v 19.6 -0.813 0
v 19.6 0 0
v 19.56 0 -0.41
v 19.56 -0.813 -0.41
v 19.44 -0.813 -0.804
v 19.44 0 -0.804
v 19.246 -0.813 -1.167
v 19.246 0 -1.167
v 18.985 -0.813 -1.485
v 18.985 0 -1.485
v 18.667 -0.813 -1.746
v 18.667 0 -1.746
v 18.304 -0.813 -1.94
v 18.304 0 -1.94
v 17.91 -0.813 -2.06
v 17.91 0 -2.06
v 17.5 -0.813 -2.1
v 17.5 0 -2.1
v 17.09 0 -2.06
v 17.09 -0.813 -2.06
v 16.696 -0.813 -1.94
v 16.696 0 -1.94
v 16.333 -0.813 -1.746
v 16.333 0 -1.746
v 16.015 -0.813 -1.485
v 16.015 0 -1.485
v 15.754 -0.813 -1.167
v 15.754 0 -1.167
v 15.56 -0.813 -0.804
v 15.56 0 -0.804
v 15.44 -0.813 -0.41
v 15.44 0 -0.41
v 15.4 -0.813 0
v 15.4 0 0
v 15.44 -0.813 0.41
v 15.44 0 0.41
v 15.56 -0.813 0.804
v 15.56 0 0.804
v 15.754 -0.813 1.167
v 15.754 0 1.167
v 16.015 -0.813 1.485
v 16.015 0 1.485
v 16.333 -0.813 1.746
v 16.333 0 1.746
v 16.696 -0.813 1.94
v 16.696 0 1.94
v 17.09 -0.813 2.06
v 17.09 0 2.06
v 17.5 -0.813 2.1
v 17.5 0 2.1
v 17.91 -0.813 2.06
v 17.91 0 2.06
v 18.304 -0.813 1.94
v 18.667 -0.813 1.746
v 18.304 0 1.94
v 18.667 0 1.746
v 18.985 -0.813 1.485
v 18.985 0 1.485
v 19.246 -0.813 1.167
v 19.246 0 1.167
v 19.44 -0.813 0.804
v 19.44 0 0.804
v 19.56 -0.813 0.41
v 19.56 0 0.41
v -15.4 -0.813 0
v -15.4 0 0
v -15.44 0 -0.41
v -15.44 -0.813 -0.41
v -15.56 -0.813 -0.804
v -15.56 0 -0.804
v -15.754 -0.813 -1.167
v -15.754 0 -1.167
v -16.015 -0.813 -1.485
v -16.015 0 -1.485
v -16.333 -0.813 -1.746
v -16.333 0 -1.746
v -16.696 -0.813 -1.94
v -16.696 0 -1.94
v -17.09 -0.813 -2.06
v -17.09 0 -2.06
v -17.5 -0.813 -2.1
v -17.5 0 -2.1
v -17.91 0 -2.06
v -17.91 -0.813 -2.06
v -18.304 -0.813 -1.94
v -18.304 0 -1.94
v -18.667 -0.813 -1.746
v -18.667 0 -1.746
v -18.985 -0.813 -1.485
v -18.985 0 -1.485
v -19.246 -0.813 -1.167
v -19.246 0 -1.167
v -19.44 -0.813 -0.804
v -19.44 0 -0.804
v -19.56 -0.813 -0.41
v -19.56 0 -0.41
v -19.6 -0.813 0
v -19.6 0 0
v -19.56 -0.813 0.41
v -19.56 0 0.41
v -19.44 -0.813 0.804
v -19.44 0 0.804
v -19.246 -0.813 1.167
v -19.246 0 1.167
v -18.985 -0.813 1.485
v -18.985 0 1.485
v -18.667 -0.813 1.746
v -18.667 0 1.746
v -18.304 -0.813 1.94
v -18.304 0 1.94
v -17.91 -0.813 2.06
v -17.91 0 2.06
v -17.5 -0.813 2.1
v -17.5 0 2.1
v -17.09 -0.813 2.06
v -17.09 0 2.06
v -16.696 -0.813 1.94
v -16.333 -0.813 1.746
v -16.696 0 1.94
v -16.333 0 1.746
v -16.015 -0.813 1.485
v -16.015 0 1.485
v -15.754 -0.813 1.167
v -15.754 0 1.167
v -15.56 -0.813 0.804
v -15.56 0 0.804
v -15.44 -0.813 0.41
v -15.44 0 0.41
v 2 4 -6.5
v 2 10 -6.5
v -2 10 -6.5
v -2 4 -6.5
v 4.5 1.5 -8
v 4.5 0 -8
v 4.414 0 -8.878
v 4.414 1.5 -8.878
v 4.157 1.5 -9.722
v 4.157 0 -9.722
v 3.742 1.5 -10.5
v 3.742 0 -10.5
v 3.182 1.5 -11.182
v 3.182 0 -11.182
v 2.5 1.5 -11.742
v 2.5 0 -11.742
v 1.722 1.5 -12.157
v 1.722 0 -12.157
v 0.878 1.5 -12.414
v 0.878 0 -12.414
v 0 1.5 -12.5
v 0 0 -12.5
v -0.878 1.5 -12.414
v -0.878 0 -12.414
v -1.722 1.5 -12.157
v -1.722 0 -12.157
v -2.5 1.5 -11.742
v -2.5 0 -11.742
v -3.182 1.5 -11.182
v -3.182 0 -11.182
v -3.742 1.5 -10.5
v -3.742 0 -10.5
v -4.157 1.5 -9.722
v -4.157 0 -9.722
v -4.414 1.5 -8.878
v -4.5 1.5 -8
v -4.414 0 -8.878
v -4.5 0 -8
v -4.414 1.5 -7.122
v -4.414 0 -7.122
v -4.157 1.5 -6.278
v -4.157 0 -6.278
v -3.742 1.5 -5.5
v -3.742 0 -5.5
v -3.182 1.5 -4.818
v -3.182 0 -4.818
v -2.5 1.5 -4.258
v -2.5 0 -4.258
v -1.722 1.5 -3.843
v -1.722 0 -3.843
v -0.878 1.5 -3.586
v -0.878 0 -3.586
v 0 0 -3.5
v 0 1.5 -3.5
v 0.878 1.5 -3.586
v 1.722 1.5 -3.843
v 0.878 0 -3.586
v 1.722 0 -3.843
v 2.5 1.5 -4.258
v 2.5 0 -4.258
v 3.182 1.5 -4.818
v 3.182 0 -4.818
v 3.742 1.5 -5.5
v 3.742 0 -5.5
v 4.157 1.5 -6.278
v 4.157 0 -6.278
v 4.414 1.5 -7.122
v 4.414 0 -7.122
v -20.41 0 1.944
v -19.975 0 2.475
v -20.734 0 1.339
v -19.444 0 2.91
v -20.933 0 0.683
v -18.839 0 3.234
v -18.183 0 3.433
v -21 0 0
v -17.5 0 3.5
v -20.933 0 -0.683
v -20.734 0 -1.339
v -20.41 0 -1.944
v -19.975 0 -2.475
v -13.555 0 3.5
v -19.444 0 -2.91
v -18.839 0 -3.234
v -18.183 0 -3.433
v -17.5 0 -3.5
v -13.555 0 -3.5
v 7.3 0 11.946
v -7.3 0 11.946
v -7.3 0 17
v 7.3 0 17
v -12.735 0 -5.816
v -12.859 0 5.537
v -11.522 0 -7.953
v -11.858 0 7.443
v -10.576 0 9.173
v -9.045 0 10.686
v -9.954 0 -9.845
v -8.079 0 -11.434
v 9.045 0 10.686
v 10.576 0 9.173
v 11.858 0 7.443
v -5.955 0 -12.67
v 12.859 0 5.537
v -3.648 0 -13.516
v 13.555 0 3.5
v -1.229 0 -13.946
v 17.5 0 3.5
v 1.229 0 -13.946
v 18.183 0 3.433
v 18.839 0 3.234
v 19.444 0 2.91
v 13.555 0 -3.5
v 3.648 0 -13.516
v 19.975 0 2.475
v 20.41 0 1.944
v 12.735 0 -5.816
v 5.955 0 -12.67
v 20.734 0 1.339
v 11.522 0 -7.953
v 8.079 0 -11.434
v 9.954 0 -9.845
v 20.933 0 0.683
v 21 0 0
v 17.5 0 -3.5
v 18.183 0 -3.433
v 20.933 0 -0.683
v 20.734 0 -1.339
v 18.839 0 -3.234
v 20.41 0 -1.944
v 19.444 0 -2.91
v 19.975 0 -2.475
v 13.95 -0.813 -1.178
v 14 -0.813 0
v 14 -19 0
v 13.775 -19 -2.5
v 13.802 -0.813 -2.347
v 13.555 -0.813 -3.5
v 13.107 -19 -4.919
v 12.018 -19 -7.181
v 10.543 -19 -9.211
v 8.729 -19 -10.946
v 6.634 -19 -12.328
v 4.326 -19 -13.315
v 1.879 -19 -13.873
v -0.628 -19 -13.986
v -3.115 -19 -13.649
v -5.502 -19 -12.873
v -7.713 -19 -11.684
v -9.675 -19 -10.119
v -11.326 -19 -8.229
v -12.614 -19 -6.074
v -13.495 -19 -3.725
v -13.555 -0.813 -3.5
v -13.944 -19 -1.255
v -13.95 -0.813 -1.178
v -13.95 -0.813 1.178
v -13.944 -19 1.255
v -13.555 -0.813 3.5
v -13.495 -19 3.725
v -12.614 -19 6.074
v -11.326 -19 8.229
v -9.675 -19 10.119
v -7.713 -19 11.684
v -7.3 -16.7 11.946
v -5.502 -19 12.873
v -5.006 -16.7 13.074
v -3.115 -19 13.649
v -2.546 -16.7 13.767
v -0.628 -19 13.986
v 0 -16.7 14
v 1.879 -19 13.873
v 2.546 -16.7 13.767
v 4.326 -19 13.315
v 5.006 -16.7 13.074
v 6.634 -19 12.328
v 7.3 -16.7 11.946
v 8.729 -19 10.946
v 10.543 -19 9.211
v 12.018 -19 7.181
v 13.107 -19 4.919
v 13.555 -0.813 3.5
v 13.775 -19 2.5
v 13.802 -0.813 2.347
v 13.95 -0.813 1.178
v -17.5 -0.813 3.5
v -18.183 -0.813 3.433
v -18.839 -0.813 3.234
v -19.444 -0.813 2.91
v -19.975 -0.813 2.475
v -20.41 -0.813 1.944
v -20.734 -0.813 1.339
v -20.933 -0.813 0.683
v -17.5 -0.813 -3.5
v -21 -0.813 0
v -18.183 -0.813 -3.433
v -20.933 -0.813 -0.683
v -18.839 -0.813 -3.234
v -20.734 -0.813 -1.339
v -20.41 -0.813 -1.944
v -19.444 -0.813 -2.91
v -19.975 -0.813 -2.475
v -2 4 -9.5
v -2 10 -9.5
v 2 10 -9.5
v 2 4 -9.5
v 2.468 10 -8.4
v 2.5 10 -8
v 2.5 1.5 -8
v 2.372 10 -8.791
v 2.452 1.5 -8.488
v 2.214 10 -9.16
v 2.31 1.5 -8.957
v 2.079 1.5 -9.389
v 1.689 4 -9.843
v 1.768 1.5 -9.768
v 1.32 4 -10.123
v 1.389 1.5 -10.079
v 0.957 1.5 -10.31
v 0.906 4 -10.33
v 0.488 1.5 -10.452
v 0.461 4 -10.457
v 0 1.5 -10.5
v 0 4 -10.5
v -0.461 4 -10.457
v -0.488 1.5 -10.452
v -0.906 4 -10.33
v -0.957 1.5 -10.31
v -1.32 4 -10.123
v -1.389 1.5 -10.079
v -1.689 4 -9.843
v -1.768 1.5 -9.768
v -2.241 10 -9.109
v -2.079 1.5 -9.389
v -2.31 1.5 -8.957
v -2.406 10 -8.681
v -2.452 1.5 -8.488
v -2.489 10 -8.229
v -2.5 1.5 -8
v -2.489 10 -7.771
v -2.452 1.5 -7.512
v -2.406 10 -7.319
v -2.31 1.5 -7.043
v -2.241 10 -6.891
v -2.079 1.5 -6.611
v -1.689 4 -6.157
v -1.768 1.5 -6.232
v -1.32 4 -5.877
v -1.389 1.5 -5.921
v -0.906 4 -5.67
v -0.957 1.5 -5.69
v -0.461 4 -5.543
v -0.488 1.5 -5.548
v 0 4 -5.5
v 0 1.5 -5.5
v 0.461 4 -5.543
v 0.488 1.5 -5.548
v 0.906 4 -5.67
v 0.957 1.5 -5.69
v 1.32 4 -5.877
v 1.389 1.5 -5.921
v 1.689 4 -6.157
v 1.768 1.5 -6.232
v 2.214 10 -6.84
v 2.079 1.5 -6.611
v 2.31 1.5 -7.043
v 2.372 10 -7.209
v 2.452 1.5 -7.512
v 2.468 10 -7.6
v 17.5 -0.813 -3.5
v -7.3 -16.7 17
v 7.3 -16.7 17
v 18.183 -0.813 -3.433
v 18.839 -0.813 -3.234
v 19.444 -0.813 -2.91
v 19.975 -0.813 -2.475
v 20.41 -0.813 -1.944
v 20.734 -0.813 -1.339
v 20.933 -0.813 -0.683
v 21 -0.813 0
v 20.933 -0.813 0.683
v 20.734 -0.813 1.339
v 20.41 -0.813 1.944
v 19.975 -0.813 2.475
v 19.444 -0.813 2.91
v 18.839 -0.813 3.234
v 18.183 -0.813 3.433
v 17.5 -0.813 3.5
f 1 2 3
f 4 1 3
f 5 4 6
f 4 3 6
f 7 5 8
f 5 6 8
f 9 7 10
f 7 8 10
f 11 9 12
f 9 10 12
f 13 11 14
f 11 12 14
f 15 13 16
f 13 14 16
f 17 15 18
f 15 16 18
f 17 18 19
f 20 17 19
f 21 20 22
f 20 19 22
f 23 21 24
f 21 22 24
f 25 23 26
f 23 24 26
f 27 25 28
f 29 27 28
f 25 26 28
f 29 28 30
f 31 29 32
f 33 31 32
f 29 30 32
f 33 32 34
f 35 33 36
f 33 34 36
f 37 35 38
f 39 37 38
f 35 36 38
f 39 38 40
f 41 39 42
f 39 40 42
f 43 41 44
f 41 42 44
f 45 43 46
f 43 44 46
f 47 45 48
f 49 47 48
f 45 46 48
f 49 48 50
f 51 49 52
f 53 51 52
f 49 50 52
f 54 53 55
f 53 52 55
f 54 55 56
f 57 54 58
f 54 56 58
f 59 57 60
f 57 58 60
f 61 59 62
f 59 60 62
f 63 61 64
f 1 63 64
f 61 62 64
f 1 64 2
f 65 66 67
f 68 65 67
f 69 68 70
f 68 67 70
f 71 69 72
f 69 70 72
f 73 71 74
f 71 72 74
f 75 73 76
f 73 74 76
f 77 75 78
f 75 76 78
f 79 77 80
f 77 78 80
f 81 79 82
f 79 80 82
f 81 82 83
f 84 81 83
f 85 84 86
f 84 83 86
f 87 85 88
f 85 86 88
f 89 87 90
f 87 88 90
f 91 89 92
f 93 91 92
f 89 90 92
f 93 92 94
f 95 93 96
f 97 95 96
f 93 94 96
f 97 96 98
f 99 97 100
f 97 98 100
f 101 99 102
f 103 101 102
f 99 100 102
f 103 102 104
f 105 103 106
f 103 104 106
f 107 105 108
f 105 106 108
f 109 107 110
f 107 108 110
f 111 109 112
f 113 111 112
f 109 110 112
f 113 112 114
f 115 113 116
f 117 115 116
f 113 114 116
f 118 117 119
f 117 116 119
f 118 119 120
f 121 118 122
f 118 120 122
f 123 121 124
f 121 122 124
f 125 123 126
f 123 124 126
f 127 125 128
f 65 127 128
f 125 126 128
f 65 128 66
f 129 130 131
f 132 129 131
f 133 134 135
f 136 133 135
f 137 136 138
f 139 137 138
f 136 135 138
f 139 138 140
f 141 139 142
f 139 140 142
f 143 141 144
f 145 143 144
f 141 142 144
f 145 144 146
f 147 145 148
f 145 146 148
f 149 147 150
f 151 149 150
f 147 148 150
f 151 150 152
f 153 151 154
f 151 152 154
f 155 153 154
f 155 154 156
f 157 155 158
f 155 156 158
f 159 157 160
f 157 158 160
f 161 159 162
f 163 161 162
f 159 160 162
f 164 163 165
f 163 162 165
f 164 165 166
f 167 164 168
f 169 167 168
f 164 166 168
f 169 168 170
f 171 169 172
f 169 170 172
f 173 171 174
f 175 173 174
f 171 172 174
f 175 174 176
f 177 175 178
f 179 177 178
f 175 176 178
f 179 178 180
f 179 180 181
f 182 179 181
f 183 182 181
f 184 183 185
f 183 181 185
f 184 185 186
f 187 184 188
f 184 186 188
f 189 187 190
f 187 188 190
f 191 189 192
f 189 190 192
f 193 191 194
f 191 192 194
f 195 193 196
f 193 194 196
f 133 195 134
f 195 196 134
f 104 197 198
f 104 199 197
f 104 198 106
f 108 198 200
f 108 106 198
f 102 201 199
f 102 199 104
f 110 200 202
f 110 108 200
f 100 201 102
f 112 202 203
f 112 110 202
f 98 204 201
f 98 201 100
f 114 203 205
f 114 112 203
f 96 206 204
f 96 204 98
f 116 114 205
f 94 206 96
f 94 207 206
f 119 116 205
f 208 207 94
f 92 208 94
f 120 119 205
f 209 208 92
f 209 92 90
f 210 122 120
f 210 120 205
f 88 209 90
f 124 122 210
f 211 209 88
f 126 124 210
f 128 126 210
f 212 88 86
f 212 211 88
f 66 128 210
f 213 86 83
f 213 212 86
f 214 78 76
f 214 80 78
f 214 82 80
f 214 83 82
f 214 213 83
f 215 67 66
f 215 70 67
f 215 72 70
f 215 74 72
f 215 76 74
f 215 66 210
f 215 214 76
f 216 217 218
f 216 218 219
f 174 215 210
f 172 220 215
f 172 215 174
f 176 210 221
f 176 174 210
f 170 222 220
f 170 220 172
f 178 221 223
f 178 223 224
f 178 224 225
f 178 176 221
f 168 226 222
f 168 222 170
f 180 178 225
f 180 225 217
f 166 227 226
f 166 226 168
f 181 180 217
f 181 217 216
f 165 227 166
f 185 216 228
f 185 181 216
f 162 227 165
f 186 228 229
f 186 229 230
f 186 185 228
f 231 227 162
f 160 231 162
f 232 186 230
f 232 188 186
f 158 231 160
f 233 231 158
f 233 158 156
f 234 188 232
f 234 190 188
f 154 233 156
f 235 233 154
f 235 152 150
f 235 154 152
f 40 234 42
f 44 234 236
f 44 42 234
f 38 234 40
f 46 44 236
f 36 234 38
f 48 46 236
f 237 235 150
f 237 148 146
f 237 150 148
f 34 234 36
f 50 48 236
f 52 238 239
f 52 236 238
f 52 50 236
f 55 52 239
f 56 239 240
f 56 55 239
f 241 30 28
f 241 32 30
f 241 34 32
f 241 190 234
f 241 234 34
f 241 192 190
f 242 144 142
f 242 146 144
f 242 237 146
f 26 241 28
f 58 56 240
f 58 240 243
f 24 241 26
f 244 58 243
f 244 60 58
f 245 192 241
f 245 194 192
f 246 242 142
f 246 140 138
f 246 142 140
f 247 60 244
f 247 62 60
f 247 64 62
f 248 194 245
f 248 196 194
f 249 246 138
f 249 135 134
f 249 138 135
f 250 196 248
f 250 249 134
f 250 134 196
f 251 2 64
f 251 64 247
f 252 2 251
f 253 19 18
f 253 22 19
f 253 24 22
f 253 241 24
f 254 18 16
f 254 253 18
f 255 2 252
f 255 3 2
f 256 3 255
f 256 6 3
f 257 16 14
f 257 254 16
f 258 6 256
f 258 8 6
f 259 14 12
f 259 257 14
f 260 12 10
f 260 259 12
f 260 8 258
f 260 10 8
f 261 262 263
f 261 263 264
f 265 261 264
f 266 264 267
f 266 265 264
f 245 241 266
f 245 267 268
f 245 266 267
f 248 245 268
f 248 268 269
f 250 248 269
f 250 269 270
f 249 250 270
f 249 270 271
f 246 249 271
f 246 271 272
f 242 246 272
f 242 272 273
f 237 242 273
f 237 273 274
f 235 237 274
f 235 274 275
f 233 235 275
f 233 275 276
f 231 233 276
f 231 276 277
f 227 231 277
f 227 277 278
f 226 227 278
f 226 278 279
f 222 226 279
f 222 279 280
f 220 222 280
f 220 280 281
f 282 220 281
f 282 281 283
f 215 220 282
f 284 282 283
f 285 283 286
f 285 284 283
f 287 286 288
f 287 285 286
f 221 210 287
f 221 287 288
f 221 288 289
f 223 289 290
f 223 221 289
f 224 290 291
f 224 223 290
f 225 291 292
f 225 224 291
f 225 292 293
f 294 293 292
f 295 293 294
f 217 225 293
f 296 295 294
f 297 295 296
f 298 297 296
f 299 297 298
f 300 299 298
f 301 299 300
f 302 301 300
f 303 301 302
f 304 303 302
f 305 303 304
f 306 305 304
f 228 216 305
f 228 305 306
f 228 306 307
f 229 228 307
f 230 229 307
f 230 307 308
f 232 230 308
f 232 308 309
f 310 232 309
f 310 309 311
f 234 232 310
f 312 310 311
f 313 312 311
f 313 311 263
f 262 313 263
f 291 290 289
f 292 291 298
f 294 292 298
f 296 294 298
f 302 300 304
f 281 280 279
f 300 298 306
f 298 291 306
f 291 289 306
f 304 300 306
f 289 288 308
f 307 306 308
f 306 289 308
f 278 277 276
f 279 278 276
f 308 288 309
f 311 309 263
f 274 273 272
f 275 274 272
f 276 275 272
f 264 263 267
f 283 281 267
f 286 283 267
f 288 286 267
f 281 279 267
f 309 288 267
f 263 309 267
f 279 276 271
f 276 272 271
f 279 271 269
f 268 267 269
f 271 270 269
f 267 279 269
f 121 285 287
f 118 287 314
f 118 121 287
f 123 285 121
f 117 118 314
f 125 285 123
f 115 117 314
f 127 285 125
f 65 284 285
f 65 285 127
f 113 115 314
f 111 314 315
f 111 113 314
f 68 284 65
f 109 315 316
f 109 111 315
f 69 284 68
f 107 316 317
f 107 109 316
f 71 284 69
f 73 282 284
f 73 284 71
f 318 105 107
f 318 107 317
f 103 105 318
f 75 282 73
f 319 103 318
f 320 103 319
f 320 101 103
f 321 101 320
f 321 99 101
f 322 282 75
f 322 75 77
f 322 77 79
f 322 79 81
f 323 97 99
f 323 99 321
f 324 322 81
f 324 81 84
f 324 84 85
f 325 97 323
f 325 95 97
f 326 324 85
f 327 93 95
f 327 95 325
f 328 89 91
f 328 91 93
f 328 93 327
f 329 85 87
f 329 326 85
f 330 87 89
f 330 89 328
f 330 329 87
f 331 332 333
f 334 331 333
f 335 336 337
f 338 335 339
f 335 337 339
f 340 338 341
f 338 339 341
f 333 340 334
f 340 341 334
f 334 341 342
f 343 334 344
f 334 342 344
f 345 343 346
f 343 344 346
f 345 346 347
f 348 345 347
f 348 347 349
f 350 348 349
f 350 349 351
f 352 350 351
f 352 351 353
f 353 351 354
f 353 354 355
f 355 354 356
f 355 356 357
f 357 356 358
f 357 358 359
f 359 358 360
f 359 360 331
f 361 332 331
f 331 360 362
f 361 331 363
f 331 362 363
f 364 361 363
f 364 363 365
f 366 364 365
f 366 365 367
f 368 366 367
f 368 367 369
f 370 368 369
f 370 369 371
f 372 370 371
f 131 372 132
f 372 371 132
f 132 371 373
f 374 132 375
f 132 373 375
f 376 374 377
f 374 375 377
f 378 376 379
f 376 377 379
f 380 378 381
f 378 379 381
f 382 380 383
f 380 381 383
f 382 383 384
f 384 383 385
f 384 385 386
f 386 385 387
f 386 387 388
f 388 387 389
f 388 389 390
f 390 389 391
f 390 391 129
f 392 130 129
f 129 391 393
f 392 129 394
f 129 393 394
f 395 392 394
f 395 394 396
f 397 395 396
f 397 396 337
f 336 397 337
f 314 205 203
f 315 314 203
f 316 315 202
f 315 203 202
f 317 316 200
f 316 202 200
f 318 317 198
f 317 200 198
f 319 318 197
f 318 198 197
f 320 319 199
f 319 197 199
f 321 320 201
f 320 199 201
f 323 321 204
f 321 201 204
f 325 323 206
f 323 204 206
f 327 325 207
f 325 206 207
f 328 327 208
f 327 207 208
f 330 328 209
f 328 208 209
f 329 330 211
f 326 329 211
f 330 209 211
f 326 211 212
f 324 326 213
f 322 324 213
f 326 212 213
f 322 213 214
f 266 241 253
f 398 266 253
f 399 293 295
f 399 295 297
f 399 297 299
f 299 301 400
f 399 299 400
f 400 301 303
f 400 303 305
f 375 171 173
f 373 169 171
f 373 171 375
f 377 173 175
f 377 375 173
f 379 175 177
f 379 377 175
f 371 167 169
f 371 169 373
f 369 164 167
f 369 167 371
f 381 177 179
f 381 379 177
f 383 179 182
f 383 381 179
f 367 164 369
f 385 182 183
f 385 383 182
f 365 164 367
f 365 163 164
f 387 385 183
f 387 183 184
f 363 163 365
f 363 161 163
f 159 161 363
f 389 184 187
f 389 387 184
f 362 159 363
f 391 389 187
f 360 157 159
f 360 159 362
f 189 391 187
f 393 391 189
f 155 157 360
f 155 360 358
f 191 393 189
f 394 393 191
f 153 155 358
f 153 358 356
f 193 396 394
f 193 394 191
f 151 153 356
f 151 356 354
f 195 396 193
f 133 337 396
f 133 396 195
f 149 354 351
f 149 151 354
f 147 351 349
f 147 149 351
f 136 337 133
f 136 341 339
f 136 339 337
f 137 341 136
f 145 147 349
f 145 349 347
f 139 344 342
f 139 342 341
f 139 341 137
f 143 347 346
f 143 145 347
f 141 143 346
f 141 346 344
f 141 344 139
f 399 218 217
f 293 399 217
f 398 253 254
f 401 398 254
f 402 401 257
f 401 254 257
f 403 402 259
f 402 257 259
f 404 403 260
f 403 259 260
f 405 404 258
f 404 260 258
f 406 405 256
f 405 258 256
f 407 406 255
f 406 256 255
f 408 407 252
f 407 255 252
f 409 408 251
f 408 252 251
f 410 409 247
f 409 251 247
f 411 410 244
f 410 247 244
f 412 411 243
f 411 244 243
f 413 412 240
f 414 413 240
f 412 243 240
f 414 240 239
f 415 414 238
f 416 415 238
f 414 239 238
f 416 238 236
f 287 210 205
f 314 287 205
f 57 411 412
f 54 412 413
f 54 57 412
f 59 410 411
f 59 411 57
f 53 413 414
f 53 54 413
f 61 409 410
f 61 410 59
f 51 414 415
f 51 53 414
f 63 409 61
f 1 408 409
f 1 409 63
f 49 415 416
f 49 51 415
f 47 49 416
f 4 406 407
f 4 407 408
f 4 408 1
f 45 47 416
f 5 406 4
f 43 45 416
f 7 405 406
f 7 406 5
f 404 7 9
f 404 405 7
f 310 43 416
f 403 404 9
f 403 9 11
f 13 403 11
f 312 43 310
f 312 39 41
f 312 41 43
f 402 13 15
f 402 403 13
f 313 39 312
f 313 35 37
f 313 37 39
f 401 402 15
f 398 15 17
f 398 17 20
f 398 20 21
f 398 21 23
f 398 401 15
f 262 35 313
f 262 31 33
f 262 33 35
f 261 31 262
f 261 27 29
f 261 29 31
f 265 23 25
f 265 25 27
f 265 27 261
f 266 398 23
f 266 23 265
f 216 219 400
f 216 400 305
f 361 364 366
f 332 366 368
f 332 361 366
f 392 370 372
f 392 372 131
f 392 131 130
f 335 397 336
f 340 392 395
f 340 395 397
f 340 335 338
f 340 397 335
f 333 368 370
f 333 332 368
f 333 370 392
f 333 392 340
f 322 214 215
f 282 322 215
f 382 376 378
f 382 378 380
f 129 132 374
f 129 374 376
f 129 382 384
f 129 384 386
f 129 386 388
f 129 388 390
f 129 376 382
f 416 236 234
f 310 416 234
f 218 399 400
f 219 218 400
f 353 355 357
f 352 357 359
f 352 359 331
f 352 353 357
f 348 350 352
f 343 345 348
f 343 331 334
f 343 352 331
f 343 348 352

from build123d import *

# Parameters (mm, degrees)
SKETCH1_R           = 14
BOSS_EXTRUDE1_DEPTH = 19
BOSS_EXTRUDE2_DEPTH = 0.8128
SKETCH3_R           = 2.1
CUT_EXTRUDE1_DEPTH  = 0.8128
SKETCH4_R           = 4.5
BOSS_EXTRUDE3_DEPTH = 1.5
BOSS_EXTRUDE4_START = -1.5
SKETCH5_R           = 2.5
BOSS_EXTRUDE4_DEPTH = 10
CUT_EXTRUDE2_DEPTH  = 6
SKETCH7_W           = 14.6
SKETCH7_H           = 5.05387092
BOSS_EXTRUDE5_DEPTH = 16.7


with BuildPart() as part:
    # Sketch1 → Boss-Extrude1 (new body)
    with BuildSketch(Plane(origin=(0, 0, 0), x_dir=(1, 0, 0), z_dir=(0, 1, 0))):
        Circle(SKETCH1_R)
    extrude(amount=-BOSS_EXTRUDE1_DEPTH)

    # Sketch2 → Boss-Extrude2 (add)
    with BuildSketch(Plane(origin=(0, 0, 0), x_dir=(1, 0, 0), z_dir=(0, 1, 0))):
        with BuildLine():
            Line((-17.5, 3.5), (17.5, 3.5))
            ThreePointArc((17.5, 3.5), (21, 0), (17.5, -3.5))
            Line((17.5, -3.5), (-17.5, -3.5))
            ThreePointArc((-17.5, -3.5), (-21, 0), (-17.5, 3.5))
        make_face()
    extrude(amount=-BOSS_EXTRUDE2_DEPTH)

    # Sketch3 → Cut-Extrude1 (cut)
    with BuildSketch(Plane(origin=(0, 0, 0), x_dir=(1, 0, 0), z_dir=(0, 1, 0))):
        with Locations((-17.5, 0)):
            Circle(SKETCH3_R)
        with Locations((17.5, 0)):
            Circle(SKETCH3_R)
    extrude(amount=-CUT_EXTRUDE1_DEPTH, mode=Mode.SUBTRACT)

    # Sketch4 → Boss-Extrude3 (add)
    with BuildSketch(Plane(origin=(0, 0, 0), x_dir=(1, 0, 0), z_dir=(0, 1, 0))):
        with Locations((0, 8)):
            Circle(SKETCH4_R)
    extrude(amount=BOSS_EXTRUDE3_DEPTH)

    # Sketch5 → Boss-Extrude4 (add)
    with BuildSketch(Plane(origin=(0, 1.5, 0), x_dir=(1, 0, 0), z_dir=(0, 1, 0)).offset(BOSS_EXTRUDE4_START)):
        with Locations((0, 8)):
            Circle(SKETCH5_R)
    extrude(amount=BOSS_EXTRUDE4_DEPTH)

    # Sketch6 → Cut-Extrude2 (cut)
    with BuildSketch(Plane(origin=(0, 10, 0), x_dir=(1, 0, 0), z_dir=(0, 1, 0))):
        with BuildLine():
            ThreePointArc((2, 9.5), (0, 10.5), (-2, 9.5))
            Line((-2, 9.5), (2, 9.5))
        make_face()
        with BuildLine():
            Line((2, 6.5), (-2, 6.5))
            ThreePointArc((-2, 6.5), (0, 5.5), (2, 6.5))
        make_face()
    extrude(amount=-CUT_EXTRUDE2_DEPTH, mode=Mode.SUBTRACT)

    # Sketch7 → Boss-Extrude5 (add)
    with BuildSketch(Plane(origin=(0, 0, 0), x_dir=(1, 0, 0), z_dir=(0, 1, 0))):
        with Locations((0, -14.47306454)):
            Rectangle(SKETCH7_W, SKETCH7_H)
    extrude(amount=-BOSS_EXTRUDE5_DEPTH)


solid = part.part
